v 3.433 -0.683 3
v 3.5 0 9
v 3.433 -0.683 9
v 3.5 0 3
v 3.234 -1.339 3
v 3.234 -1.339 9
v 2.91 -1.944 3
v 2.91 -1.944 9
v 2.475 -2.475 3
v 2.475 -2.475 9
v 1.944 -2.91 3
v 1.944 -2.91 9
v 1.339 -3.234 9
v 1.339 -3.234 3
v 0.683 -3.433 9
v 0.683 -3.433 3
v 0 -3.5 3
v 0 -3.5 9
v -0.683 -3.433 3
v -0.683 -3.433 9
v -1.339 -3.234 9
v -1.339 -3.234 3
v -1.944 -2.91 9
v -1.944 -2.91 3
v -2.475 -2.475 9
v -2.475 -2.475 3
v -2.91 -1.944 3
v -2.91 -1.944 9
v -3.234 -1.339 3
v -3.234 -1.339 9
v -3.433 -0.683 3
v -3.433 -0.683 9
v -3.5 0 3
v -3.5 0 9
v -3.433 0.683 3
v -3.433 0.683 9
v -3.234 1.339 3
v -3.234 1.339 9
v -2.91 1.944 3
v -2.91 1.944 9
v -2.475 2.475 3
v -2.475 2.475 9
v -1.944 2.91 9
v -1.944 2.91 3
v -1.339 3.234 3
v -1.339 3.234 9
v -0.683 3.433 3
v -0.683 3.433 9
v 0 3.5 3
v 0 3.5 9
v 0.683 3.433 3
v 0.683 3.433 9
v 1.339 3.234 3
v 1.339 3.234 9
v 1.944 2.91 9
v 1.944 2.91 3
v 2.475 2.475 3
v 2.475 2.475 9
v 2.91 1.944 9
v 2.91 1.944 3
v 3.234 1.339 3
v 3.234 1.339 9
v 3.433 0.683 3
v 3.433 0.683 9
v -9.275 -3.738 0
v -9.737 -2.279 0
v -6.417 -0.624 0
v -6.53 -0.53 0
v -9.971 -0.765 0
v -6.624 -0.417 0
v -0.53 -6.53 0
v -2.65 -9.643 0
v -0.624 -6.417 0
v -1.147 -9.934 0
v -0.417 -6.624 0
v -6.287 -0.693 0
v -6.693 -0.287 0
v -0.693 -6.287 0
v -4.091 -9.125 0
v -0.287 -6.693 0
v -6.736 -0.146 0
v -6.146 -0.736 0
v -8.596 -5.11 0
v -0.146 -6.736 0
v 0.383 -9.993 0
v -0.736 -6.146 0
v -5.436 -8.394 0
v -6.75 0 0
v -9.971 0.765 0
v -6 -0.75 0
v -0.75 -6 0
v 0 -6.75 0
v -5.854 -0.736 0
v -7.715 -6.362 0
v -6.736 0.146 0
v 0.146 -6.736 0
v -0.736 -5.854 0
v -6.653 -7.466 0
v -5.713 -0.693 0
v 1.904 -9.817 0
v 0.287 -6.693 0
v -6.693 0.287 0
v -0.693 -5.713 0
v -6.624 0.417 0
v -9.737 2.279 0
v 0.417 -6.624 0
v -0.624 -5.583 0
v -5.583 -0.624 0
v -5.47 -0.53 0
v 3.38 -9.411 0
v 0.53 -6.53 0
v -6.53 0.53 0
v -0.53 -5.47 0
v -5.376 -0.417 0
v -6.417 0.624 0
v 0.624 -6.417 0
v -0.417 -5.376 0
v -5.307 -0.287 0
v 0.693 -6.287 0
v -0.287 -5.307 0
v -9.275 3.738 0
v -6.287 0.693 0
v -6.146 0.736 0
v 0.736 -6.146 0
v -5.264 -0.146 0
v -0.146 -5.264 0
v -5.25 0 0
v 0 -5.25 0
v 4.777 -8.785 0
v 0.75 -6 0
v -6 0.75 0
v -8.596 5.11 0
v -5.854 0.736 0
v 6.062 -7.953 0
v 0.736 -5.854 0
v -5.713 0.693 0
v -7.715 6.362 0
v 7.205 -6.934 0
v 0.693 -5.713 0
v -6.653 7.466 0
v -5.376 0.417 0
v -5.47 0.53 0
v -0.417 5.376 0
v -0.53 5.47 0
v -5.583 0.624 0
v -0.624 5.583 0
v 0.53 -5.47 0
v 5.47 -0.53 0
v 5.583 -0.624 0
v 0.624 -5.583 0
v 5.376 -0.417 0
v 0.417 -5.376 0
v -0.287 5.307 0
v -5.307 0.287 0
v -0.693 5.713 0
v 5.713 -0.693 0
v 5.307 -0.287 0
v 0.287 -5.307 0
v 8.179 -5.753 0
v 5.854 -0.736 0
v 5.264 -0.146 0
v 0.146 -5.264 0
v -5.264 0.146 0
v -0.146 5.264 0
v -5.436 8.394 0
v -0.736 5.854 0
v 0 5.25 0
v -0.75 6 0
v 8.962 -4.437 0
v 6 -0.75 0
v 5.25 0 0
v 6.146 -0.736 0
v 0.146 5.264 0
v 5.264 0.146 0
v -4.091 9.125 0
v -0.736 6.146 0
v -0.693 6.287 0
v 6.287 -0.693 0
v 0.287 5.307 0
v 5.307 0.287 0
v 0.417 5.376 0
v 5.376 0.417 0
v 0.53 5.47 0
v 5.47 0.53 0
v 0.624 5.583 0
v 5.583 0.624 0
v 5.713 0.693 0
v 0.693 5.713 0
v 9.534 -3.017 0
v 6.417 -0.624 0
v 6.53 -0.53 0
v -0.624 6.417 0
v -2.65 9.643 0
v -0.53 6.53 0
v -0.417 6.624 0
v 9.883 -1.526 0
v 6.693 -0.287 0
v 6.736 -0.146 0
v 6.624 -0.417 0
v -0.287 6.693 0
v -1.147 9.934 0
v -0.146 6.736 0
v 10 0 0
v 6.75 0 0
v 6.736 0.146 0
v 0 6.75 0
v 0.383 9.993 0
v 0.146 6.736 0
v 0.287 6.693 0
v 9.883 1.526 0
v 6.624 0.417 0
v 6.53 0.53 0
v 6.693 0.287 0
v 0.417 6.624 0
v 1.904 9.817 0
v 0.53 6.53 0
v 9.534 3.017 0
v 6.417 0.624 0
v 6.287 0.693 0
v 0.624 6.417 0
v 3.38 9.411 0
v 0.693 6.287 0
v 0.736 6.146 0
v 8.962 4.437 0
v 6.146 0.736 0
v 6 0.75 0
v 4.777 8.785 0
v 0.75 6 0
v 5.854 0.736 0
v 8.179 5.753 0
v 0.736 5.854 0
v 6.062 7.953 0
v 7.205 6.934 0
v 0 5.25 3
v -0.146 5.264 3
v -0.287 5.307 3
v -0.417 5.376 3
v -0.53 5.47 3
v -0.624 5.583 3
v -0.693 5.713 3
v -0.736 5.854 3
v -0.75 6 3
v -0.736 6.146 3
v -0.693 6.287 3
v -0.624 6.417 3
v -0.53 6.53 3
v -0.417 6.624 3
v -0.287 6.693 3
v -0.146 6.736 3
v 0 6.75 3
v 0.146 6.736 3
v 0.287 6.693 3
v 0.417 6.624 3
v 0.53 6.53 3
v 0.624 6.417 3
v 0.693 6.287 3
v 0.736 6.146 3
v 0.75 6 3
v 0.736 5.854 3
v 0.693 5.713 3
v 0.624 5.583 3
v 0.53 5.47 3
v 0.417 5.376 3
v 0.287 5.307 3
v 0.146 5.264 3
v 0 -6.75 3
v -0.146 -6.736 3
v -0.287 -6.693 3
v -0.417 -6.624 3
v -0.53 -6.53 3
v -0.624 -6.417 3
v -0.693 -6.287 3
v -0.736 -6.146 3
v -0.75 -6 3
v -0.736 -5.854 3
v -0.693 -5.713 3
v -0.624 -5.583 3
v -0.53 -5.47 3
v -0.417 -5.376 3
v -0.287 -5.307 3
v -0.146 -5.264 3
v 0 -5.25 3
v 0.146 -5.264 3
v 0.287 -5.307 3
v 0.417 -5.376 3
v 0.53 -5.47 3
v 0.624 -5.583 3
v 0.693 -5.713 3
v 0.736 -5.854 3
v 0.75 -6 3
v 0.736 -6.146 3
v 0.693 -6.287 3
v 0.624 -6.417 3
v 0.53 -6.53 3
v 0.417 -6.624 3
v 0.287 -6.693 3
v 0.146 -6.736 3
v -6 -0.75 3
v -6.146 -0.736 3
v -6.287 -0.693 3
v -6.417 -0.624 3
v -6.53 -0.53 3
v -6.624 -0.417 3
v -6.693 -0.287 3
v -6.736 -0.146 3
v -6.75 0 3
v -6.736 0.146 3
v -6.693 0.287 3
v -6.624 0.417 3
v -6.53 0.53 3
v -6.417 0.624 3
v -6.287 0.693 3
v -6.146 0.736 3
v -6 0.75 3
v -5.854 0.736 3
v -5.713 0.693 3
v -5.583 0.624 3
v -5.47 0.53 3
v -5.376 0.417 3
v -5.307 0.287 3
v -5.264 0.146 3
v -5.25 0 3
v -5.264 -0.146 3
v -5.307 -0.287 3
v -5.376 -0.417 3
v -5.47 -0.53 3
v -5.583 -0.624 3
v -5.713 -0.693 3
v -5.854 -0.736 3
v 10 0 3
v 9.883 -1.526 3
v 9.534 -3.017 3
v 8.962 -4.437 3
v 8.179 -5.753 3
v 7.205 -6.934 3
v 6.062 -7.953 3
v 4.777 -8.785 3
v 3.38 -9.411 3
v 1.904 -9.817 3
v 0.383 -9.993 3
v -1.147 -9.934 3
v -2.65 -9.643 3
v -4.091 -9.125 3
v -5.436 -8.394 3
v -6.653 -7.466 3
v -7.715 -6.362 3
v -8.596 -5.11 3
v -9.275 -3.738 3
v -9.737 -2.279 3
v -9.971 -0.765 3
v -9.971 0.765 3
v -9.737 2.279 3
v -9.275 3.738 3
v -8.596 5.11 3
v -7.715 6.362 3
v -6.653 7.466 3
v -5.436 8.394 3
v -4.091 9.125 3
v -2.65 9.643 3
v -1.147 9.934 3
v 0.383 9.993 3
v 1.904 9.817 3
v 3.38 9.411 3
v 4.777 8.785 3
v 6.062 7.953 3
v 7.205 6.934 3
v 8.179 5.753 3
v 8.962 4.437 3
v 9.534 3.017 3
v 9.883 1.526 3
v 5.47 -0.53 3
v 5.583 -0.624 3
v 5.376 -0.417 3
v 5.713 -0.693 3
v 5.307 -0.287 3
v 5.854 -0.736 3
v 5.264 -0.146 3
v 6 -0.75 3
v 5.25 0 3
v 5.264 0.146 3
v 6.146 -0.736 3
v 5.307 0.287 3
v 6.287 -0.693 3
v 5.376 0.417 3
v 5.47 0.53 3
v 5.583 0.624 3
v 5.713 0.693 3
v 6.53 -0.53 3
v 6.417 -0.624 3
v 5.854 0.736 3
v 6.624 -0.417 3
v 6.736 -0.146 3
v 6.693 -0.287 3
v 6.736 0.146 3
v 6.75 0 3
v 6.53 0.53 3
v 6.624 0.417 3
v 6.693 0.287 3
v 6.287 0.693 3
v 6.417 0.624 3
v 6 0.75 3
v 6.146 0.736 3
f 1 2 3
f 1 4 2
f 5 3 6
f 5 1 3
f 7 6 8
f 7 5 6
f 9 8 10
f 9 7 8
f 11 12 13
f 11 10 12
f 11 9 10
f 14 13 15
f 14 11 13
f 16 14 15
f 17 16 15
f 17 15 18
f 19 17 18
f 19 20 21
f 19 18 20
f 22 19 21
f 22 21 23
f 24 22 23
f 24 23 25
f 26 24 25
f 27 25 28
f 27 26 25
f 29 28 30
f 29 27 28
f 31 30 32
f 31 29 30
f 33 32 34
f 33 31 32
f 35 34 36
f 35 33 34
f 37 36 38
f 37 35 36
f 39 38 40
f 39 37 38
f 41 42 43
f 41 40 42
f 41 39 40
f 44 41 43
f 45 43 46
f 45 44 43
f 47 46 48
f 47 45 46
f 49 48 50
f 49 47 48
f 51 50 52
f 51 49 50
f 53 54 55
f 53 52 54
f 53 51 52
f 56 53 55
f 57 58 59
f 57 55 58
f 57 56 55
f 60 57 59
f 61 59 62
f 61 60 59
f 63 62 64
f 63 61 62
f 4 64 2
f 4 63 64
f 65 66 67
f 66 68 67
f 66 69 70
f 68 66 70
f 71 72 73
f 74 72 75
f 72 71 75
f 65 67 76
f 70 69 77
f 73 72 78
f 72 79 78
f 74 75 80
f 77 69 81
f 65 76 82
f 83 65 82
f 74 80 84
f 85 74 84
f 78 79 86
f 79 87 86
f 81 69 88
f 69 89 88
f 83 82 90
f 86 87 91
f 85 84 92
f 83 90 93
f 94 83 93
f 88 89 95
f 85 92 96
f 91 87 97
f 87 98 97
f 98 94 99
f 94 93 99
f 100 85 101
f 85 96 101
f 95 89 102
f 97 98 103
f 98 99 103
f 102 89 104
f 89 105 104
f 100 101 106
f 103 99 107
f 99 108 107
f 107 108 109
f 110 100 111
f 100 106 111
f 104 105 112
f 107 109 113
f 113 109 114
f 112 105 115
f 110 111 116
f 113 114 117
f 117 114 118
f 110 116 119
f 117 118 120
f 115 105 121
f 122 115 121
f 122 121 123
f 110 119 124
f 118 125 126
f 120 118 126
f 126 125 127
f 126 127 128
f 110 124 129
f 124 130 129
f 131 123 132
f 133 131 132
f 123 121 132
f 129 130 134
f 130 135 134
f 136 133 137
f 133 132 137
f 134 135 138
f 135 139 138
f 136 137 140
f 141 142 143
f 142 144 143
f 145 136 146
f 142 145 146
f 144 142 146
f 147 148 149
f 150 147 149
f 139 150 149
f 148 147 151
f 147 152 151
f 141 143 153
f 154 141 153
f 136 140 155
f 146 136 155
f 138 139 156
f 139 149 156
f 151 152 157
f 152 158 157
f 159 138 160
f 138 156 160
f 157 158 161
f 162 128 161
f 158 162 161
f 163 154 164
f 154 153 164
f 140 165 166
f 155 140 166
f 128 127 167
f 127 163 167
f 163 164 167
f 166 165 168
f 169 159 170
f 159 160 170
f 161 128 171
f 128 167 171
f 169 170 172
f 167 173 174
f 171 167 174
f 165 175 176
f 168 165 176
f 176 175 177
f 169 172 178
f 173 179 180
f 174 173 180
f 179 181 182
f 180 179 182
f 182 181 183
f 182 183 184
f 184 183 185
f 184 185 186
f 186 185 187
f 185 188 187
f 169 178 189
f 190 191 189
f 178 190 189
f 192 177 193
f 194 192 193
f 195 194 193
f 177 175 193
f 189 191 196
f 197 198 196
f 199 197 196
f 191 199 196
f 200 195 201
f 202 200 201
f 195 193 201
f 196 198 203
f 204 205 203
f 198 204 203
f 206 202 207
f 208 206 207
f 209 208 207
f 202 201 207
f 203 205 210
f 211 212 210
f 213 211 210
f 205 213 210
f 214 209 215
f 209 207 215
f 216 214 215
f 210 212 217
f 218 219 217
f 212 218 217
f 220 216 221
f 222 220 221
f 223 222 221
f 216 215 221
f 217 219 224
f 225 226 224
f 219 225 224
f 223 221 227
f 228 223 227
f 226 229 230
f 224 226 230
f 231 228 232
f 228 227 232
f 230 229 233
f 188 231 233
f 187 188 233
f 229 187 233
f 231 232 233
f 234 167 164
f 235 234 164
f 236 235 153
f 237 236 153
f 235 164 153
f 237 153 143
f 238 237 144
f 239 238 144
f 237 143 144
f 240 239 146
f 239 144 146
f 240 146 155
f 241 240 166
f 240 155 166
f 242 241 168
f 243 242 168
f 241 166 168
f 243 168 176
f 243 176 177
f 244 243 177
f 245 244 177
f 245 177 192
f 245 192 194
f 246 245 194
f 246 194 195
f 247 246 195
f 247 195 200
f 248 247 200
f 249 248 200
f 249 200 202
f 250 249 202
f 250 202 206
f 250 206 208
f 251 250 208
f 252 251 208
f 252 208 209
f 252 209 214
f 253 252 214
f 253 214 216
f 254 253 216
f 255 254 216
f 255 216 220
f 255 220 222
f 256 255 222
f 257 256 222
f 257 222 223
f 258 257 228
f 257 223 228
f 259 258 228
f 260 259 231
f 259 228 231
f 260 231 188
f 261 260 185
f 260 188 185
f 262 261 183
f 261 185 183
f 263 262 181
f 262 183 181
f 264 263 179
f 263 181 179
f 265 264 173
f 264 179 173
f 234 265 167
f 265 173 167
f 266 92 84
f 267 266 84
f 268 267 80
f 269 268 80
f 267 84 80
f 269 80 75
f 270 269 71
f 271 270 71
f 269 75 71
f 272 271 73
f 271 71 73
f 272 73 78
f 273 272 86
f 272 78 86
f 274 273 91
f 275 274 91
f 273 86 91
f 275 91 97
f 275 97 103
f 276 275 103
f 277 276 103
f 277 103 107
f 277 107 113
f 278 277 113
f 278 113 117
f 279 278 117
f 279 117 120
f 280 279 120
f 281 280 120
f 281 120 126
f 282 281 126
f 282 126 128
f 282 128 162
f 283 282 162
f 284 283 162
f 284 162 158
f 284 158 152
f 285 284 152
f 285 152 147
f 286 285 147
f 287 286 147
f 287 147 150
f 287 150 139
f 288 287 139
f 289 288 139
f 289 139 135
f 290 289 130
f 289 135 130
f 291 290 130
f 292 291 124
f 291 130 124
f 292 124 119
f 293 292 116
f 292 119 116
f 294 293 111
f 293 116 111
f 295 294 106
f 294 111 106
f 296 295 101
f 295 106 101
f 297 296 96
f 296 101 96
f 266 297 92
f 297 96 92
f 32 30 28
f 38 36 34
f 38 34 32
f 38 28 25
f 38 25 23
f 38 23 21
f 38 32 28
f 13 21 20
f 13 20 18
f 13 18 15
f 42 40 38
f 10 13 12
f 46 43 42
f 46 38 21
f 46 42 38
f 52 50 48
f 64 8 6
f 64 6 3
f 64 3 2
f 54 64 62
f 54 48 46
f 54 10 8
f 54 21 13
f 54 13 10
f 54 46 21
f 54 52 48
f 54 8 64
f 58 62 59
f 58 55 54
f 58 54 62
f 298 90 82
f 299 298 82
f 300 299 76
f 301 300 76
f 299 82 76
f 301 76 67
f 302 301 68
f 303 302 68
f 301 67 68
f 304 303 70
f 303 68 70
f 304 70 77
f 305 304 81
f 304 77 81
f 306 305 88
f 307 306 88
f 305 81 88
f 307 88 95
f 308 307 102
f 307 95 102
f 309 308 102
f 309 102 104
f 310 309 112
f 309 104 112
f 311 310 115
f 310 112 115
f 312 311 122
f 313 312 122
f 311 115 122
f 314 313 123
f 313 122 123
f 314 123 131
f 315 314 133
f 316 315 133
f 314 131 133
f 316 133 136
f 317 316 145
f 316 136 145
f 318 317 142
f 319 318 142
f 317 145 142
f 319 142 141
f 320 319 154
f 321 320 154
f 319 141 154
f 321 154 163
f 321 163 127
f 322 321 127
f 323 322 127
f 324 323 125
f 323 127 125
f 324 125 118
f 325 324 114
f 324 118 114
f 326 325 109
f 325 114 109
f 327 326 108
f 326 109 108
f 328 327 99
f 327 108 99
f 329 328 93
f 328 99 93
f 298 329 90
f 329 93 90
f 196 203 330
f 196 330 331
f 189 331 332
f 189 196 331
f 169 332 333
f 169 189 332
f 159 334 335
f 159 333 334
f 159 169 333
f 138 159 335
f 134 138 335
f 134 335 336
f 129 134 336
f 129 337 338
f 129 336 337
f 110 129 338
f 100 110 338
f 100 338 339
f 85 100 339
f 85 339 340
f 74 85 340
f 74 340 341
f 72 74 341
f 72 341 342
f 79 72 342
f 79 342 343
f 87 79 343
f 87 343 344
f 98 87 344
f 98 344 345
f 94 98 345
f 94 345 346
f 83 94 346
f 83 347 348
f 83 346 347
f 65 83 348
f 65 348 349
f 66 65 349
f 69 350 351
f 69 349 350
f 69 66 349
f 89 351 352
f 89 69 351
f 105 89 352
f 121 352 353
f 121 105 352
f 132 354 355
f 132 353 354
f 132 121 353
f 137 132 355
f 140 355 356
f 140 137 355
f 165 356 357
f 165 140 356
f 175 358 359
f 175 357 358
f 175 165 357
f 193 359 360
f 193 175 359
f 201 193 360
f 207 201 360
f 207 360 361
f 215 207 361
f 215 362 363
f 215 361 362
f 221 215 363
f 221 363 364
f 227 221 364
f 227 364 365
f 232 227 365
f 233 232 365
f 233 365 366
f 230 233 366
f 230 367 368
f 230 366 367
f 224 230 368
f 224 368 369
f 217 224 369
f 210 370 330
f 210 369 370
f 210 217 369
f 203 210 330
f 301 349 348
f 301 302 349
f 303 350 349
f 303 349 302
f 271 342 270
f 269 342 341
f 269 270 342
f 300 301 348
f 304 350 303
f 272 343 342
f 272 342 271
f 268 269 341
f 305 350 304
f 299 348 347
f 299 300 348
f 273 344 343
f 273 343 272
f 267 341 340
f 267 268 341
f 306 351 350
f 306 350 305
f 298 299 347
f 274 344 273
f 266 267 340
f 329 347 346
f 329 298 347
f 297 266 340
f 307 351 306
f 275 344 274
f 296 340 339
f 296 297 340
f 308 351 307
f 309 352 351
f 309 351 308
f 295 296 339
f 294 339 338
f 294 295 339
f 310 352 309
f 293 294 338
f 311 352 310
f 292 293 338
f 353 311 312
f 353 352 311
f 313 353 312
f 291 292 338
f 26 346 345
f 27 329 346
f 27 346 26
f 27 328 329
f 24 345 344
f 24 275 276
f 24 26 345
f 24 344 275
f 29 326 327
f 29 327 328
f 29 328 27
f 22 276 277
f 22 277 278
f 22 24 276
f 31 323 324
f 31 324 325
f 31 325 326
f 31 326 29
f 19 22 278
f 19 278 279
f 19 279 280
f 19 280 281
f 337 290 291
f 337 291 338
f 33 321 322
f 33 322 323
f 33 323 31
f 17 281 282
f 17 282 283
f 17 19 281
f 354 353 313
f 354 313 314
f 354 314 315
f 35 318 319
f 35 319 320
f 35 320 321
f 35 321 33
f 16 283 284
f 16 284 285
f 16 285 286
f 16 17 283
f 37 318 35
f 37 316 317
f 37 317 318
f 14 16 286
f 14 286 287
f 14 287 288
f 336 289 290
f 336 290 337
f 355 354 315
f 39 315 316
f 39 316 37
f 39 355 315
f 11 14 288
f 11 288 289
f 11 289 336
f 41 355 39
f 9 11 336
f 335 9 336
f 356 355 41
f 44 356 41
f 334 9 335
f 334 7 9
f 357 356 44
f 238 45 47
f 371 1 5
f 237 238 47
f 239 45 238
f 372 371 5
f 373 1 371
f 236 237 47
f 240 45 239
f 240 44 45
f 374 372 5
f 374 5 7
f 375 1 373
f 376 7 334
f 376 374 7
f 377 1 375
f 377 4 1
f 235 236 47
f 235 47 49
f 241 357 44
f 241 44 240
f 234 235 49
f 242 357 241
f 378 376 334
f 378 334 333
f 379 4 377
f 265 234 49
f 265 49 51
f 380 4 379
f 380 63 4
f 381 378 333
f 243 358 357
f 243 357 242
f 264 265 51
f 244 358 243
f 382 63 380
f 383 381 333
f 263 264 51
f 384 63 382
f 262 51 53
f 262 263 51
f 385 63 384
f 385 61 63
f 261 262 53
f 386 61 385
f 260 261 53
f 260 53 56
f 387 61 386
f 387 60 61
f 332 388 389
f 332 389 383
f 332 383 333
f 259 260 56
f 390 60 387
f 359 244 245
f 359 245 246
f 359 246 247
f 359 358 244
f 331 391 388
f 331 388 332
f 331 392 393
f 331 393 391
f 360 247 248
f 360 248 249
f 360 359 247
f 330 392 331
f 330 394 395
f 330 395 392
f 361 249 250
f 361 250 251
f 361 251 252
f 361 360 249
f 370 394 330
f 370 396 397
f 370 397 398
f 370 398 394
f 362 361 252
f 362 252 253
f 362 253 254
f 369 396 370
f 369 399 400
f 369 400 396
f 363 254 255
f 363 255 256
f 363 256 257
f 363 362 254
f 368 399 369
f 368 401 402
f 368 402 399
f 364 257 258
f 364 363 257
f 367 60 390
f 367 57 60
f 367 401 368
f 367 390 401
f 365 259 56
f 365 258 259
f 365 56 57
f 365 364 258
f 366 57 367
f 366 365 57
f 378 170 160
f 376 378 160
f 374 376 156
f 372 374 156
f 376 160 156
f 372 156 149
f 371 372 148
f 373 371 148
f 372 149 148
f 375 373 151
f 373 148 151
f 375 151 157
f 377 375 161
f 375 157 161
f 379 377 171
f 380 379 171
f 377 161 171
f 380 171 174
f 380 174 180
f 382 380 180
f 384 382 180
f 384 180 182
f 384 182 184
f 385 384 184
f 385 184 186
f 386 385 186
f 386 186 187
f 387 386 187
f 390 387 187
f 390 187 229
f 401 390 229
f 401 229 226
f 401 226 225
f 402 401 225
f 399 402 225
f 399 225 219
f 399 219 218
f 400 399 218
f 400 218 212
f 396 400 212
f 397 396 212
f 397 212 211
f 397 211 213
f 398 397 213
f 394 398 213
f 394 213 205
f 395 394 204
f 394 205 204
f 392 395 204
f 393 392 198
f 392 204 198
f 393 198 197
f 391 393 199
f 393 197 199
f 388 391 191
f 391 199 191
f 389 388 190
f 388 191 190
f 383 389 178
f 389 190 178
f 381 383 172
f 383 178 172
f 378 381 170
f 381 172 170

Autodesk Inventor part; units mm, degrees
ref_plane "YZ Plane" through (0, 0, 0) normal (1, 0, 0) x (0, 1, 0)
ref_plane "XZ Plane" through (0, 0, 0) normal (0, 1, 0) x (-1, 0, 0)
ref_plane "XY Plane" through (0, 0, 0) normal (0, 0, 1) x (1, 0, 0)
sketch "スケッチ6" plane through (0, 0, 0) normal (0, 0, 1) x (1, 0, 0)
  point P0 (0, 0)
sketch "スケッチ7" plane through (0, 0, 0) normal (0, 0, 1) x (1, 0, 0)
  circle A0 centre (0, 0) radius 10
  circle A1 centre (0, 0) radius 6
  point P0 (0, 6)
  point P1 (-6, 0)
  point P2 (0, -6)
  point P3 (6, 0)
  dimension "d29" = 12
  dimension "d28" = 20
  dimension "d32" = 360
extrude "押し出し5" add sketch "スケッチ7" along normal blind 3 contours A0 | A1
sketch "スケッチ8" plane through (0, 0, 3) normal (0, 0, 1) x (1, 0, 0)
  circle A0 centre (0, 0) radius 6
  point P0 (0, 6)
  point P1 (-6, 0)
  point P2 (0, -6)
  point P3 (6, 0)
  dimension "d36" = 12
  dimension "d39" = 360
hole "穴2" at (0, 6, 3) at (-6, 0, 3) at (0, -6, 3) at (6, 0, 3) direction (0, 0, -1) diameter 1.5 end through all
sketch "スケッチ9" plane through (0, 0, 3) normal (0, 0, 1) x (1, 0, 0)
  circle A0 centre (0, 0) radius 3.5
  dimension "d48" = 7
extrude "押し出し6" add sketch "スケッチ9" along normal blind 6
properties part number "gear_01"
